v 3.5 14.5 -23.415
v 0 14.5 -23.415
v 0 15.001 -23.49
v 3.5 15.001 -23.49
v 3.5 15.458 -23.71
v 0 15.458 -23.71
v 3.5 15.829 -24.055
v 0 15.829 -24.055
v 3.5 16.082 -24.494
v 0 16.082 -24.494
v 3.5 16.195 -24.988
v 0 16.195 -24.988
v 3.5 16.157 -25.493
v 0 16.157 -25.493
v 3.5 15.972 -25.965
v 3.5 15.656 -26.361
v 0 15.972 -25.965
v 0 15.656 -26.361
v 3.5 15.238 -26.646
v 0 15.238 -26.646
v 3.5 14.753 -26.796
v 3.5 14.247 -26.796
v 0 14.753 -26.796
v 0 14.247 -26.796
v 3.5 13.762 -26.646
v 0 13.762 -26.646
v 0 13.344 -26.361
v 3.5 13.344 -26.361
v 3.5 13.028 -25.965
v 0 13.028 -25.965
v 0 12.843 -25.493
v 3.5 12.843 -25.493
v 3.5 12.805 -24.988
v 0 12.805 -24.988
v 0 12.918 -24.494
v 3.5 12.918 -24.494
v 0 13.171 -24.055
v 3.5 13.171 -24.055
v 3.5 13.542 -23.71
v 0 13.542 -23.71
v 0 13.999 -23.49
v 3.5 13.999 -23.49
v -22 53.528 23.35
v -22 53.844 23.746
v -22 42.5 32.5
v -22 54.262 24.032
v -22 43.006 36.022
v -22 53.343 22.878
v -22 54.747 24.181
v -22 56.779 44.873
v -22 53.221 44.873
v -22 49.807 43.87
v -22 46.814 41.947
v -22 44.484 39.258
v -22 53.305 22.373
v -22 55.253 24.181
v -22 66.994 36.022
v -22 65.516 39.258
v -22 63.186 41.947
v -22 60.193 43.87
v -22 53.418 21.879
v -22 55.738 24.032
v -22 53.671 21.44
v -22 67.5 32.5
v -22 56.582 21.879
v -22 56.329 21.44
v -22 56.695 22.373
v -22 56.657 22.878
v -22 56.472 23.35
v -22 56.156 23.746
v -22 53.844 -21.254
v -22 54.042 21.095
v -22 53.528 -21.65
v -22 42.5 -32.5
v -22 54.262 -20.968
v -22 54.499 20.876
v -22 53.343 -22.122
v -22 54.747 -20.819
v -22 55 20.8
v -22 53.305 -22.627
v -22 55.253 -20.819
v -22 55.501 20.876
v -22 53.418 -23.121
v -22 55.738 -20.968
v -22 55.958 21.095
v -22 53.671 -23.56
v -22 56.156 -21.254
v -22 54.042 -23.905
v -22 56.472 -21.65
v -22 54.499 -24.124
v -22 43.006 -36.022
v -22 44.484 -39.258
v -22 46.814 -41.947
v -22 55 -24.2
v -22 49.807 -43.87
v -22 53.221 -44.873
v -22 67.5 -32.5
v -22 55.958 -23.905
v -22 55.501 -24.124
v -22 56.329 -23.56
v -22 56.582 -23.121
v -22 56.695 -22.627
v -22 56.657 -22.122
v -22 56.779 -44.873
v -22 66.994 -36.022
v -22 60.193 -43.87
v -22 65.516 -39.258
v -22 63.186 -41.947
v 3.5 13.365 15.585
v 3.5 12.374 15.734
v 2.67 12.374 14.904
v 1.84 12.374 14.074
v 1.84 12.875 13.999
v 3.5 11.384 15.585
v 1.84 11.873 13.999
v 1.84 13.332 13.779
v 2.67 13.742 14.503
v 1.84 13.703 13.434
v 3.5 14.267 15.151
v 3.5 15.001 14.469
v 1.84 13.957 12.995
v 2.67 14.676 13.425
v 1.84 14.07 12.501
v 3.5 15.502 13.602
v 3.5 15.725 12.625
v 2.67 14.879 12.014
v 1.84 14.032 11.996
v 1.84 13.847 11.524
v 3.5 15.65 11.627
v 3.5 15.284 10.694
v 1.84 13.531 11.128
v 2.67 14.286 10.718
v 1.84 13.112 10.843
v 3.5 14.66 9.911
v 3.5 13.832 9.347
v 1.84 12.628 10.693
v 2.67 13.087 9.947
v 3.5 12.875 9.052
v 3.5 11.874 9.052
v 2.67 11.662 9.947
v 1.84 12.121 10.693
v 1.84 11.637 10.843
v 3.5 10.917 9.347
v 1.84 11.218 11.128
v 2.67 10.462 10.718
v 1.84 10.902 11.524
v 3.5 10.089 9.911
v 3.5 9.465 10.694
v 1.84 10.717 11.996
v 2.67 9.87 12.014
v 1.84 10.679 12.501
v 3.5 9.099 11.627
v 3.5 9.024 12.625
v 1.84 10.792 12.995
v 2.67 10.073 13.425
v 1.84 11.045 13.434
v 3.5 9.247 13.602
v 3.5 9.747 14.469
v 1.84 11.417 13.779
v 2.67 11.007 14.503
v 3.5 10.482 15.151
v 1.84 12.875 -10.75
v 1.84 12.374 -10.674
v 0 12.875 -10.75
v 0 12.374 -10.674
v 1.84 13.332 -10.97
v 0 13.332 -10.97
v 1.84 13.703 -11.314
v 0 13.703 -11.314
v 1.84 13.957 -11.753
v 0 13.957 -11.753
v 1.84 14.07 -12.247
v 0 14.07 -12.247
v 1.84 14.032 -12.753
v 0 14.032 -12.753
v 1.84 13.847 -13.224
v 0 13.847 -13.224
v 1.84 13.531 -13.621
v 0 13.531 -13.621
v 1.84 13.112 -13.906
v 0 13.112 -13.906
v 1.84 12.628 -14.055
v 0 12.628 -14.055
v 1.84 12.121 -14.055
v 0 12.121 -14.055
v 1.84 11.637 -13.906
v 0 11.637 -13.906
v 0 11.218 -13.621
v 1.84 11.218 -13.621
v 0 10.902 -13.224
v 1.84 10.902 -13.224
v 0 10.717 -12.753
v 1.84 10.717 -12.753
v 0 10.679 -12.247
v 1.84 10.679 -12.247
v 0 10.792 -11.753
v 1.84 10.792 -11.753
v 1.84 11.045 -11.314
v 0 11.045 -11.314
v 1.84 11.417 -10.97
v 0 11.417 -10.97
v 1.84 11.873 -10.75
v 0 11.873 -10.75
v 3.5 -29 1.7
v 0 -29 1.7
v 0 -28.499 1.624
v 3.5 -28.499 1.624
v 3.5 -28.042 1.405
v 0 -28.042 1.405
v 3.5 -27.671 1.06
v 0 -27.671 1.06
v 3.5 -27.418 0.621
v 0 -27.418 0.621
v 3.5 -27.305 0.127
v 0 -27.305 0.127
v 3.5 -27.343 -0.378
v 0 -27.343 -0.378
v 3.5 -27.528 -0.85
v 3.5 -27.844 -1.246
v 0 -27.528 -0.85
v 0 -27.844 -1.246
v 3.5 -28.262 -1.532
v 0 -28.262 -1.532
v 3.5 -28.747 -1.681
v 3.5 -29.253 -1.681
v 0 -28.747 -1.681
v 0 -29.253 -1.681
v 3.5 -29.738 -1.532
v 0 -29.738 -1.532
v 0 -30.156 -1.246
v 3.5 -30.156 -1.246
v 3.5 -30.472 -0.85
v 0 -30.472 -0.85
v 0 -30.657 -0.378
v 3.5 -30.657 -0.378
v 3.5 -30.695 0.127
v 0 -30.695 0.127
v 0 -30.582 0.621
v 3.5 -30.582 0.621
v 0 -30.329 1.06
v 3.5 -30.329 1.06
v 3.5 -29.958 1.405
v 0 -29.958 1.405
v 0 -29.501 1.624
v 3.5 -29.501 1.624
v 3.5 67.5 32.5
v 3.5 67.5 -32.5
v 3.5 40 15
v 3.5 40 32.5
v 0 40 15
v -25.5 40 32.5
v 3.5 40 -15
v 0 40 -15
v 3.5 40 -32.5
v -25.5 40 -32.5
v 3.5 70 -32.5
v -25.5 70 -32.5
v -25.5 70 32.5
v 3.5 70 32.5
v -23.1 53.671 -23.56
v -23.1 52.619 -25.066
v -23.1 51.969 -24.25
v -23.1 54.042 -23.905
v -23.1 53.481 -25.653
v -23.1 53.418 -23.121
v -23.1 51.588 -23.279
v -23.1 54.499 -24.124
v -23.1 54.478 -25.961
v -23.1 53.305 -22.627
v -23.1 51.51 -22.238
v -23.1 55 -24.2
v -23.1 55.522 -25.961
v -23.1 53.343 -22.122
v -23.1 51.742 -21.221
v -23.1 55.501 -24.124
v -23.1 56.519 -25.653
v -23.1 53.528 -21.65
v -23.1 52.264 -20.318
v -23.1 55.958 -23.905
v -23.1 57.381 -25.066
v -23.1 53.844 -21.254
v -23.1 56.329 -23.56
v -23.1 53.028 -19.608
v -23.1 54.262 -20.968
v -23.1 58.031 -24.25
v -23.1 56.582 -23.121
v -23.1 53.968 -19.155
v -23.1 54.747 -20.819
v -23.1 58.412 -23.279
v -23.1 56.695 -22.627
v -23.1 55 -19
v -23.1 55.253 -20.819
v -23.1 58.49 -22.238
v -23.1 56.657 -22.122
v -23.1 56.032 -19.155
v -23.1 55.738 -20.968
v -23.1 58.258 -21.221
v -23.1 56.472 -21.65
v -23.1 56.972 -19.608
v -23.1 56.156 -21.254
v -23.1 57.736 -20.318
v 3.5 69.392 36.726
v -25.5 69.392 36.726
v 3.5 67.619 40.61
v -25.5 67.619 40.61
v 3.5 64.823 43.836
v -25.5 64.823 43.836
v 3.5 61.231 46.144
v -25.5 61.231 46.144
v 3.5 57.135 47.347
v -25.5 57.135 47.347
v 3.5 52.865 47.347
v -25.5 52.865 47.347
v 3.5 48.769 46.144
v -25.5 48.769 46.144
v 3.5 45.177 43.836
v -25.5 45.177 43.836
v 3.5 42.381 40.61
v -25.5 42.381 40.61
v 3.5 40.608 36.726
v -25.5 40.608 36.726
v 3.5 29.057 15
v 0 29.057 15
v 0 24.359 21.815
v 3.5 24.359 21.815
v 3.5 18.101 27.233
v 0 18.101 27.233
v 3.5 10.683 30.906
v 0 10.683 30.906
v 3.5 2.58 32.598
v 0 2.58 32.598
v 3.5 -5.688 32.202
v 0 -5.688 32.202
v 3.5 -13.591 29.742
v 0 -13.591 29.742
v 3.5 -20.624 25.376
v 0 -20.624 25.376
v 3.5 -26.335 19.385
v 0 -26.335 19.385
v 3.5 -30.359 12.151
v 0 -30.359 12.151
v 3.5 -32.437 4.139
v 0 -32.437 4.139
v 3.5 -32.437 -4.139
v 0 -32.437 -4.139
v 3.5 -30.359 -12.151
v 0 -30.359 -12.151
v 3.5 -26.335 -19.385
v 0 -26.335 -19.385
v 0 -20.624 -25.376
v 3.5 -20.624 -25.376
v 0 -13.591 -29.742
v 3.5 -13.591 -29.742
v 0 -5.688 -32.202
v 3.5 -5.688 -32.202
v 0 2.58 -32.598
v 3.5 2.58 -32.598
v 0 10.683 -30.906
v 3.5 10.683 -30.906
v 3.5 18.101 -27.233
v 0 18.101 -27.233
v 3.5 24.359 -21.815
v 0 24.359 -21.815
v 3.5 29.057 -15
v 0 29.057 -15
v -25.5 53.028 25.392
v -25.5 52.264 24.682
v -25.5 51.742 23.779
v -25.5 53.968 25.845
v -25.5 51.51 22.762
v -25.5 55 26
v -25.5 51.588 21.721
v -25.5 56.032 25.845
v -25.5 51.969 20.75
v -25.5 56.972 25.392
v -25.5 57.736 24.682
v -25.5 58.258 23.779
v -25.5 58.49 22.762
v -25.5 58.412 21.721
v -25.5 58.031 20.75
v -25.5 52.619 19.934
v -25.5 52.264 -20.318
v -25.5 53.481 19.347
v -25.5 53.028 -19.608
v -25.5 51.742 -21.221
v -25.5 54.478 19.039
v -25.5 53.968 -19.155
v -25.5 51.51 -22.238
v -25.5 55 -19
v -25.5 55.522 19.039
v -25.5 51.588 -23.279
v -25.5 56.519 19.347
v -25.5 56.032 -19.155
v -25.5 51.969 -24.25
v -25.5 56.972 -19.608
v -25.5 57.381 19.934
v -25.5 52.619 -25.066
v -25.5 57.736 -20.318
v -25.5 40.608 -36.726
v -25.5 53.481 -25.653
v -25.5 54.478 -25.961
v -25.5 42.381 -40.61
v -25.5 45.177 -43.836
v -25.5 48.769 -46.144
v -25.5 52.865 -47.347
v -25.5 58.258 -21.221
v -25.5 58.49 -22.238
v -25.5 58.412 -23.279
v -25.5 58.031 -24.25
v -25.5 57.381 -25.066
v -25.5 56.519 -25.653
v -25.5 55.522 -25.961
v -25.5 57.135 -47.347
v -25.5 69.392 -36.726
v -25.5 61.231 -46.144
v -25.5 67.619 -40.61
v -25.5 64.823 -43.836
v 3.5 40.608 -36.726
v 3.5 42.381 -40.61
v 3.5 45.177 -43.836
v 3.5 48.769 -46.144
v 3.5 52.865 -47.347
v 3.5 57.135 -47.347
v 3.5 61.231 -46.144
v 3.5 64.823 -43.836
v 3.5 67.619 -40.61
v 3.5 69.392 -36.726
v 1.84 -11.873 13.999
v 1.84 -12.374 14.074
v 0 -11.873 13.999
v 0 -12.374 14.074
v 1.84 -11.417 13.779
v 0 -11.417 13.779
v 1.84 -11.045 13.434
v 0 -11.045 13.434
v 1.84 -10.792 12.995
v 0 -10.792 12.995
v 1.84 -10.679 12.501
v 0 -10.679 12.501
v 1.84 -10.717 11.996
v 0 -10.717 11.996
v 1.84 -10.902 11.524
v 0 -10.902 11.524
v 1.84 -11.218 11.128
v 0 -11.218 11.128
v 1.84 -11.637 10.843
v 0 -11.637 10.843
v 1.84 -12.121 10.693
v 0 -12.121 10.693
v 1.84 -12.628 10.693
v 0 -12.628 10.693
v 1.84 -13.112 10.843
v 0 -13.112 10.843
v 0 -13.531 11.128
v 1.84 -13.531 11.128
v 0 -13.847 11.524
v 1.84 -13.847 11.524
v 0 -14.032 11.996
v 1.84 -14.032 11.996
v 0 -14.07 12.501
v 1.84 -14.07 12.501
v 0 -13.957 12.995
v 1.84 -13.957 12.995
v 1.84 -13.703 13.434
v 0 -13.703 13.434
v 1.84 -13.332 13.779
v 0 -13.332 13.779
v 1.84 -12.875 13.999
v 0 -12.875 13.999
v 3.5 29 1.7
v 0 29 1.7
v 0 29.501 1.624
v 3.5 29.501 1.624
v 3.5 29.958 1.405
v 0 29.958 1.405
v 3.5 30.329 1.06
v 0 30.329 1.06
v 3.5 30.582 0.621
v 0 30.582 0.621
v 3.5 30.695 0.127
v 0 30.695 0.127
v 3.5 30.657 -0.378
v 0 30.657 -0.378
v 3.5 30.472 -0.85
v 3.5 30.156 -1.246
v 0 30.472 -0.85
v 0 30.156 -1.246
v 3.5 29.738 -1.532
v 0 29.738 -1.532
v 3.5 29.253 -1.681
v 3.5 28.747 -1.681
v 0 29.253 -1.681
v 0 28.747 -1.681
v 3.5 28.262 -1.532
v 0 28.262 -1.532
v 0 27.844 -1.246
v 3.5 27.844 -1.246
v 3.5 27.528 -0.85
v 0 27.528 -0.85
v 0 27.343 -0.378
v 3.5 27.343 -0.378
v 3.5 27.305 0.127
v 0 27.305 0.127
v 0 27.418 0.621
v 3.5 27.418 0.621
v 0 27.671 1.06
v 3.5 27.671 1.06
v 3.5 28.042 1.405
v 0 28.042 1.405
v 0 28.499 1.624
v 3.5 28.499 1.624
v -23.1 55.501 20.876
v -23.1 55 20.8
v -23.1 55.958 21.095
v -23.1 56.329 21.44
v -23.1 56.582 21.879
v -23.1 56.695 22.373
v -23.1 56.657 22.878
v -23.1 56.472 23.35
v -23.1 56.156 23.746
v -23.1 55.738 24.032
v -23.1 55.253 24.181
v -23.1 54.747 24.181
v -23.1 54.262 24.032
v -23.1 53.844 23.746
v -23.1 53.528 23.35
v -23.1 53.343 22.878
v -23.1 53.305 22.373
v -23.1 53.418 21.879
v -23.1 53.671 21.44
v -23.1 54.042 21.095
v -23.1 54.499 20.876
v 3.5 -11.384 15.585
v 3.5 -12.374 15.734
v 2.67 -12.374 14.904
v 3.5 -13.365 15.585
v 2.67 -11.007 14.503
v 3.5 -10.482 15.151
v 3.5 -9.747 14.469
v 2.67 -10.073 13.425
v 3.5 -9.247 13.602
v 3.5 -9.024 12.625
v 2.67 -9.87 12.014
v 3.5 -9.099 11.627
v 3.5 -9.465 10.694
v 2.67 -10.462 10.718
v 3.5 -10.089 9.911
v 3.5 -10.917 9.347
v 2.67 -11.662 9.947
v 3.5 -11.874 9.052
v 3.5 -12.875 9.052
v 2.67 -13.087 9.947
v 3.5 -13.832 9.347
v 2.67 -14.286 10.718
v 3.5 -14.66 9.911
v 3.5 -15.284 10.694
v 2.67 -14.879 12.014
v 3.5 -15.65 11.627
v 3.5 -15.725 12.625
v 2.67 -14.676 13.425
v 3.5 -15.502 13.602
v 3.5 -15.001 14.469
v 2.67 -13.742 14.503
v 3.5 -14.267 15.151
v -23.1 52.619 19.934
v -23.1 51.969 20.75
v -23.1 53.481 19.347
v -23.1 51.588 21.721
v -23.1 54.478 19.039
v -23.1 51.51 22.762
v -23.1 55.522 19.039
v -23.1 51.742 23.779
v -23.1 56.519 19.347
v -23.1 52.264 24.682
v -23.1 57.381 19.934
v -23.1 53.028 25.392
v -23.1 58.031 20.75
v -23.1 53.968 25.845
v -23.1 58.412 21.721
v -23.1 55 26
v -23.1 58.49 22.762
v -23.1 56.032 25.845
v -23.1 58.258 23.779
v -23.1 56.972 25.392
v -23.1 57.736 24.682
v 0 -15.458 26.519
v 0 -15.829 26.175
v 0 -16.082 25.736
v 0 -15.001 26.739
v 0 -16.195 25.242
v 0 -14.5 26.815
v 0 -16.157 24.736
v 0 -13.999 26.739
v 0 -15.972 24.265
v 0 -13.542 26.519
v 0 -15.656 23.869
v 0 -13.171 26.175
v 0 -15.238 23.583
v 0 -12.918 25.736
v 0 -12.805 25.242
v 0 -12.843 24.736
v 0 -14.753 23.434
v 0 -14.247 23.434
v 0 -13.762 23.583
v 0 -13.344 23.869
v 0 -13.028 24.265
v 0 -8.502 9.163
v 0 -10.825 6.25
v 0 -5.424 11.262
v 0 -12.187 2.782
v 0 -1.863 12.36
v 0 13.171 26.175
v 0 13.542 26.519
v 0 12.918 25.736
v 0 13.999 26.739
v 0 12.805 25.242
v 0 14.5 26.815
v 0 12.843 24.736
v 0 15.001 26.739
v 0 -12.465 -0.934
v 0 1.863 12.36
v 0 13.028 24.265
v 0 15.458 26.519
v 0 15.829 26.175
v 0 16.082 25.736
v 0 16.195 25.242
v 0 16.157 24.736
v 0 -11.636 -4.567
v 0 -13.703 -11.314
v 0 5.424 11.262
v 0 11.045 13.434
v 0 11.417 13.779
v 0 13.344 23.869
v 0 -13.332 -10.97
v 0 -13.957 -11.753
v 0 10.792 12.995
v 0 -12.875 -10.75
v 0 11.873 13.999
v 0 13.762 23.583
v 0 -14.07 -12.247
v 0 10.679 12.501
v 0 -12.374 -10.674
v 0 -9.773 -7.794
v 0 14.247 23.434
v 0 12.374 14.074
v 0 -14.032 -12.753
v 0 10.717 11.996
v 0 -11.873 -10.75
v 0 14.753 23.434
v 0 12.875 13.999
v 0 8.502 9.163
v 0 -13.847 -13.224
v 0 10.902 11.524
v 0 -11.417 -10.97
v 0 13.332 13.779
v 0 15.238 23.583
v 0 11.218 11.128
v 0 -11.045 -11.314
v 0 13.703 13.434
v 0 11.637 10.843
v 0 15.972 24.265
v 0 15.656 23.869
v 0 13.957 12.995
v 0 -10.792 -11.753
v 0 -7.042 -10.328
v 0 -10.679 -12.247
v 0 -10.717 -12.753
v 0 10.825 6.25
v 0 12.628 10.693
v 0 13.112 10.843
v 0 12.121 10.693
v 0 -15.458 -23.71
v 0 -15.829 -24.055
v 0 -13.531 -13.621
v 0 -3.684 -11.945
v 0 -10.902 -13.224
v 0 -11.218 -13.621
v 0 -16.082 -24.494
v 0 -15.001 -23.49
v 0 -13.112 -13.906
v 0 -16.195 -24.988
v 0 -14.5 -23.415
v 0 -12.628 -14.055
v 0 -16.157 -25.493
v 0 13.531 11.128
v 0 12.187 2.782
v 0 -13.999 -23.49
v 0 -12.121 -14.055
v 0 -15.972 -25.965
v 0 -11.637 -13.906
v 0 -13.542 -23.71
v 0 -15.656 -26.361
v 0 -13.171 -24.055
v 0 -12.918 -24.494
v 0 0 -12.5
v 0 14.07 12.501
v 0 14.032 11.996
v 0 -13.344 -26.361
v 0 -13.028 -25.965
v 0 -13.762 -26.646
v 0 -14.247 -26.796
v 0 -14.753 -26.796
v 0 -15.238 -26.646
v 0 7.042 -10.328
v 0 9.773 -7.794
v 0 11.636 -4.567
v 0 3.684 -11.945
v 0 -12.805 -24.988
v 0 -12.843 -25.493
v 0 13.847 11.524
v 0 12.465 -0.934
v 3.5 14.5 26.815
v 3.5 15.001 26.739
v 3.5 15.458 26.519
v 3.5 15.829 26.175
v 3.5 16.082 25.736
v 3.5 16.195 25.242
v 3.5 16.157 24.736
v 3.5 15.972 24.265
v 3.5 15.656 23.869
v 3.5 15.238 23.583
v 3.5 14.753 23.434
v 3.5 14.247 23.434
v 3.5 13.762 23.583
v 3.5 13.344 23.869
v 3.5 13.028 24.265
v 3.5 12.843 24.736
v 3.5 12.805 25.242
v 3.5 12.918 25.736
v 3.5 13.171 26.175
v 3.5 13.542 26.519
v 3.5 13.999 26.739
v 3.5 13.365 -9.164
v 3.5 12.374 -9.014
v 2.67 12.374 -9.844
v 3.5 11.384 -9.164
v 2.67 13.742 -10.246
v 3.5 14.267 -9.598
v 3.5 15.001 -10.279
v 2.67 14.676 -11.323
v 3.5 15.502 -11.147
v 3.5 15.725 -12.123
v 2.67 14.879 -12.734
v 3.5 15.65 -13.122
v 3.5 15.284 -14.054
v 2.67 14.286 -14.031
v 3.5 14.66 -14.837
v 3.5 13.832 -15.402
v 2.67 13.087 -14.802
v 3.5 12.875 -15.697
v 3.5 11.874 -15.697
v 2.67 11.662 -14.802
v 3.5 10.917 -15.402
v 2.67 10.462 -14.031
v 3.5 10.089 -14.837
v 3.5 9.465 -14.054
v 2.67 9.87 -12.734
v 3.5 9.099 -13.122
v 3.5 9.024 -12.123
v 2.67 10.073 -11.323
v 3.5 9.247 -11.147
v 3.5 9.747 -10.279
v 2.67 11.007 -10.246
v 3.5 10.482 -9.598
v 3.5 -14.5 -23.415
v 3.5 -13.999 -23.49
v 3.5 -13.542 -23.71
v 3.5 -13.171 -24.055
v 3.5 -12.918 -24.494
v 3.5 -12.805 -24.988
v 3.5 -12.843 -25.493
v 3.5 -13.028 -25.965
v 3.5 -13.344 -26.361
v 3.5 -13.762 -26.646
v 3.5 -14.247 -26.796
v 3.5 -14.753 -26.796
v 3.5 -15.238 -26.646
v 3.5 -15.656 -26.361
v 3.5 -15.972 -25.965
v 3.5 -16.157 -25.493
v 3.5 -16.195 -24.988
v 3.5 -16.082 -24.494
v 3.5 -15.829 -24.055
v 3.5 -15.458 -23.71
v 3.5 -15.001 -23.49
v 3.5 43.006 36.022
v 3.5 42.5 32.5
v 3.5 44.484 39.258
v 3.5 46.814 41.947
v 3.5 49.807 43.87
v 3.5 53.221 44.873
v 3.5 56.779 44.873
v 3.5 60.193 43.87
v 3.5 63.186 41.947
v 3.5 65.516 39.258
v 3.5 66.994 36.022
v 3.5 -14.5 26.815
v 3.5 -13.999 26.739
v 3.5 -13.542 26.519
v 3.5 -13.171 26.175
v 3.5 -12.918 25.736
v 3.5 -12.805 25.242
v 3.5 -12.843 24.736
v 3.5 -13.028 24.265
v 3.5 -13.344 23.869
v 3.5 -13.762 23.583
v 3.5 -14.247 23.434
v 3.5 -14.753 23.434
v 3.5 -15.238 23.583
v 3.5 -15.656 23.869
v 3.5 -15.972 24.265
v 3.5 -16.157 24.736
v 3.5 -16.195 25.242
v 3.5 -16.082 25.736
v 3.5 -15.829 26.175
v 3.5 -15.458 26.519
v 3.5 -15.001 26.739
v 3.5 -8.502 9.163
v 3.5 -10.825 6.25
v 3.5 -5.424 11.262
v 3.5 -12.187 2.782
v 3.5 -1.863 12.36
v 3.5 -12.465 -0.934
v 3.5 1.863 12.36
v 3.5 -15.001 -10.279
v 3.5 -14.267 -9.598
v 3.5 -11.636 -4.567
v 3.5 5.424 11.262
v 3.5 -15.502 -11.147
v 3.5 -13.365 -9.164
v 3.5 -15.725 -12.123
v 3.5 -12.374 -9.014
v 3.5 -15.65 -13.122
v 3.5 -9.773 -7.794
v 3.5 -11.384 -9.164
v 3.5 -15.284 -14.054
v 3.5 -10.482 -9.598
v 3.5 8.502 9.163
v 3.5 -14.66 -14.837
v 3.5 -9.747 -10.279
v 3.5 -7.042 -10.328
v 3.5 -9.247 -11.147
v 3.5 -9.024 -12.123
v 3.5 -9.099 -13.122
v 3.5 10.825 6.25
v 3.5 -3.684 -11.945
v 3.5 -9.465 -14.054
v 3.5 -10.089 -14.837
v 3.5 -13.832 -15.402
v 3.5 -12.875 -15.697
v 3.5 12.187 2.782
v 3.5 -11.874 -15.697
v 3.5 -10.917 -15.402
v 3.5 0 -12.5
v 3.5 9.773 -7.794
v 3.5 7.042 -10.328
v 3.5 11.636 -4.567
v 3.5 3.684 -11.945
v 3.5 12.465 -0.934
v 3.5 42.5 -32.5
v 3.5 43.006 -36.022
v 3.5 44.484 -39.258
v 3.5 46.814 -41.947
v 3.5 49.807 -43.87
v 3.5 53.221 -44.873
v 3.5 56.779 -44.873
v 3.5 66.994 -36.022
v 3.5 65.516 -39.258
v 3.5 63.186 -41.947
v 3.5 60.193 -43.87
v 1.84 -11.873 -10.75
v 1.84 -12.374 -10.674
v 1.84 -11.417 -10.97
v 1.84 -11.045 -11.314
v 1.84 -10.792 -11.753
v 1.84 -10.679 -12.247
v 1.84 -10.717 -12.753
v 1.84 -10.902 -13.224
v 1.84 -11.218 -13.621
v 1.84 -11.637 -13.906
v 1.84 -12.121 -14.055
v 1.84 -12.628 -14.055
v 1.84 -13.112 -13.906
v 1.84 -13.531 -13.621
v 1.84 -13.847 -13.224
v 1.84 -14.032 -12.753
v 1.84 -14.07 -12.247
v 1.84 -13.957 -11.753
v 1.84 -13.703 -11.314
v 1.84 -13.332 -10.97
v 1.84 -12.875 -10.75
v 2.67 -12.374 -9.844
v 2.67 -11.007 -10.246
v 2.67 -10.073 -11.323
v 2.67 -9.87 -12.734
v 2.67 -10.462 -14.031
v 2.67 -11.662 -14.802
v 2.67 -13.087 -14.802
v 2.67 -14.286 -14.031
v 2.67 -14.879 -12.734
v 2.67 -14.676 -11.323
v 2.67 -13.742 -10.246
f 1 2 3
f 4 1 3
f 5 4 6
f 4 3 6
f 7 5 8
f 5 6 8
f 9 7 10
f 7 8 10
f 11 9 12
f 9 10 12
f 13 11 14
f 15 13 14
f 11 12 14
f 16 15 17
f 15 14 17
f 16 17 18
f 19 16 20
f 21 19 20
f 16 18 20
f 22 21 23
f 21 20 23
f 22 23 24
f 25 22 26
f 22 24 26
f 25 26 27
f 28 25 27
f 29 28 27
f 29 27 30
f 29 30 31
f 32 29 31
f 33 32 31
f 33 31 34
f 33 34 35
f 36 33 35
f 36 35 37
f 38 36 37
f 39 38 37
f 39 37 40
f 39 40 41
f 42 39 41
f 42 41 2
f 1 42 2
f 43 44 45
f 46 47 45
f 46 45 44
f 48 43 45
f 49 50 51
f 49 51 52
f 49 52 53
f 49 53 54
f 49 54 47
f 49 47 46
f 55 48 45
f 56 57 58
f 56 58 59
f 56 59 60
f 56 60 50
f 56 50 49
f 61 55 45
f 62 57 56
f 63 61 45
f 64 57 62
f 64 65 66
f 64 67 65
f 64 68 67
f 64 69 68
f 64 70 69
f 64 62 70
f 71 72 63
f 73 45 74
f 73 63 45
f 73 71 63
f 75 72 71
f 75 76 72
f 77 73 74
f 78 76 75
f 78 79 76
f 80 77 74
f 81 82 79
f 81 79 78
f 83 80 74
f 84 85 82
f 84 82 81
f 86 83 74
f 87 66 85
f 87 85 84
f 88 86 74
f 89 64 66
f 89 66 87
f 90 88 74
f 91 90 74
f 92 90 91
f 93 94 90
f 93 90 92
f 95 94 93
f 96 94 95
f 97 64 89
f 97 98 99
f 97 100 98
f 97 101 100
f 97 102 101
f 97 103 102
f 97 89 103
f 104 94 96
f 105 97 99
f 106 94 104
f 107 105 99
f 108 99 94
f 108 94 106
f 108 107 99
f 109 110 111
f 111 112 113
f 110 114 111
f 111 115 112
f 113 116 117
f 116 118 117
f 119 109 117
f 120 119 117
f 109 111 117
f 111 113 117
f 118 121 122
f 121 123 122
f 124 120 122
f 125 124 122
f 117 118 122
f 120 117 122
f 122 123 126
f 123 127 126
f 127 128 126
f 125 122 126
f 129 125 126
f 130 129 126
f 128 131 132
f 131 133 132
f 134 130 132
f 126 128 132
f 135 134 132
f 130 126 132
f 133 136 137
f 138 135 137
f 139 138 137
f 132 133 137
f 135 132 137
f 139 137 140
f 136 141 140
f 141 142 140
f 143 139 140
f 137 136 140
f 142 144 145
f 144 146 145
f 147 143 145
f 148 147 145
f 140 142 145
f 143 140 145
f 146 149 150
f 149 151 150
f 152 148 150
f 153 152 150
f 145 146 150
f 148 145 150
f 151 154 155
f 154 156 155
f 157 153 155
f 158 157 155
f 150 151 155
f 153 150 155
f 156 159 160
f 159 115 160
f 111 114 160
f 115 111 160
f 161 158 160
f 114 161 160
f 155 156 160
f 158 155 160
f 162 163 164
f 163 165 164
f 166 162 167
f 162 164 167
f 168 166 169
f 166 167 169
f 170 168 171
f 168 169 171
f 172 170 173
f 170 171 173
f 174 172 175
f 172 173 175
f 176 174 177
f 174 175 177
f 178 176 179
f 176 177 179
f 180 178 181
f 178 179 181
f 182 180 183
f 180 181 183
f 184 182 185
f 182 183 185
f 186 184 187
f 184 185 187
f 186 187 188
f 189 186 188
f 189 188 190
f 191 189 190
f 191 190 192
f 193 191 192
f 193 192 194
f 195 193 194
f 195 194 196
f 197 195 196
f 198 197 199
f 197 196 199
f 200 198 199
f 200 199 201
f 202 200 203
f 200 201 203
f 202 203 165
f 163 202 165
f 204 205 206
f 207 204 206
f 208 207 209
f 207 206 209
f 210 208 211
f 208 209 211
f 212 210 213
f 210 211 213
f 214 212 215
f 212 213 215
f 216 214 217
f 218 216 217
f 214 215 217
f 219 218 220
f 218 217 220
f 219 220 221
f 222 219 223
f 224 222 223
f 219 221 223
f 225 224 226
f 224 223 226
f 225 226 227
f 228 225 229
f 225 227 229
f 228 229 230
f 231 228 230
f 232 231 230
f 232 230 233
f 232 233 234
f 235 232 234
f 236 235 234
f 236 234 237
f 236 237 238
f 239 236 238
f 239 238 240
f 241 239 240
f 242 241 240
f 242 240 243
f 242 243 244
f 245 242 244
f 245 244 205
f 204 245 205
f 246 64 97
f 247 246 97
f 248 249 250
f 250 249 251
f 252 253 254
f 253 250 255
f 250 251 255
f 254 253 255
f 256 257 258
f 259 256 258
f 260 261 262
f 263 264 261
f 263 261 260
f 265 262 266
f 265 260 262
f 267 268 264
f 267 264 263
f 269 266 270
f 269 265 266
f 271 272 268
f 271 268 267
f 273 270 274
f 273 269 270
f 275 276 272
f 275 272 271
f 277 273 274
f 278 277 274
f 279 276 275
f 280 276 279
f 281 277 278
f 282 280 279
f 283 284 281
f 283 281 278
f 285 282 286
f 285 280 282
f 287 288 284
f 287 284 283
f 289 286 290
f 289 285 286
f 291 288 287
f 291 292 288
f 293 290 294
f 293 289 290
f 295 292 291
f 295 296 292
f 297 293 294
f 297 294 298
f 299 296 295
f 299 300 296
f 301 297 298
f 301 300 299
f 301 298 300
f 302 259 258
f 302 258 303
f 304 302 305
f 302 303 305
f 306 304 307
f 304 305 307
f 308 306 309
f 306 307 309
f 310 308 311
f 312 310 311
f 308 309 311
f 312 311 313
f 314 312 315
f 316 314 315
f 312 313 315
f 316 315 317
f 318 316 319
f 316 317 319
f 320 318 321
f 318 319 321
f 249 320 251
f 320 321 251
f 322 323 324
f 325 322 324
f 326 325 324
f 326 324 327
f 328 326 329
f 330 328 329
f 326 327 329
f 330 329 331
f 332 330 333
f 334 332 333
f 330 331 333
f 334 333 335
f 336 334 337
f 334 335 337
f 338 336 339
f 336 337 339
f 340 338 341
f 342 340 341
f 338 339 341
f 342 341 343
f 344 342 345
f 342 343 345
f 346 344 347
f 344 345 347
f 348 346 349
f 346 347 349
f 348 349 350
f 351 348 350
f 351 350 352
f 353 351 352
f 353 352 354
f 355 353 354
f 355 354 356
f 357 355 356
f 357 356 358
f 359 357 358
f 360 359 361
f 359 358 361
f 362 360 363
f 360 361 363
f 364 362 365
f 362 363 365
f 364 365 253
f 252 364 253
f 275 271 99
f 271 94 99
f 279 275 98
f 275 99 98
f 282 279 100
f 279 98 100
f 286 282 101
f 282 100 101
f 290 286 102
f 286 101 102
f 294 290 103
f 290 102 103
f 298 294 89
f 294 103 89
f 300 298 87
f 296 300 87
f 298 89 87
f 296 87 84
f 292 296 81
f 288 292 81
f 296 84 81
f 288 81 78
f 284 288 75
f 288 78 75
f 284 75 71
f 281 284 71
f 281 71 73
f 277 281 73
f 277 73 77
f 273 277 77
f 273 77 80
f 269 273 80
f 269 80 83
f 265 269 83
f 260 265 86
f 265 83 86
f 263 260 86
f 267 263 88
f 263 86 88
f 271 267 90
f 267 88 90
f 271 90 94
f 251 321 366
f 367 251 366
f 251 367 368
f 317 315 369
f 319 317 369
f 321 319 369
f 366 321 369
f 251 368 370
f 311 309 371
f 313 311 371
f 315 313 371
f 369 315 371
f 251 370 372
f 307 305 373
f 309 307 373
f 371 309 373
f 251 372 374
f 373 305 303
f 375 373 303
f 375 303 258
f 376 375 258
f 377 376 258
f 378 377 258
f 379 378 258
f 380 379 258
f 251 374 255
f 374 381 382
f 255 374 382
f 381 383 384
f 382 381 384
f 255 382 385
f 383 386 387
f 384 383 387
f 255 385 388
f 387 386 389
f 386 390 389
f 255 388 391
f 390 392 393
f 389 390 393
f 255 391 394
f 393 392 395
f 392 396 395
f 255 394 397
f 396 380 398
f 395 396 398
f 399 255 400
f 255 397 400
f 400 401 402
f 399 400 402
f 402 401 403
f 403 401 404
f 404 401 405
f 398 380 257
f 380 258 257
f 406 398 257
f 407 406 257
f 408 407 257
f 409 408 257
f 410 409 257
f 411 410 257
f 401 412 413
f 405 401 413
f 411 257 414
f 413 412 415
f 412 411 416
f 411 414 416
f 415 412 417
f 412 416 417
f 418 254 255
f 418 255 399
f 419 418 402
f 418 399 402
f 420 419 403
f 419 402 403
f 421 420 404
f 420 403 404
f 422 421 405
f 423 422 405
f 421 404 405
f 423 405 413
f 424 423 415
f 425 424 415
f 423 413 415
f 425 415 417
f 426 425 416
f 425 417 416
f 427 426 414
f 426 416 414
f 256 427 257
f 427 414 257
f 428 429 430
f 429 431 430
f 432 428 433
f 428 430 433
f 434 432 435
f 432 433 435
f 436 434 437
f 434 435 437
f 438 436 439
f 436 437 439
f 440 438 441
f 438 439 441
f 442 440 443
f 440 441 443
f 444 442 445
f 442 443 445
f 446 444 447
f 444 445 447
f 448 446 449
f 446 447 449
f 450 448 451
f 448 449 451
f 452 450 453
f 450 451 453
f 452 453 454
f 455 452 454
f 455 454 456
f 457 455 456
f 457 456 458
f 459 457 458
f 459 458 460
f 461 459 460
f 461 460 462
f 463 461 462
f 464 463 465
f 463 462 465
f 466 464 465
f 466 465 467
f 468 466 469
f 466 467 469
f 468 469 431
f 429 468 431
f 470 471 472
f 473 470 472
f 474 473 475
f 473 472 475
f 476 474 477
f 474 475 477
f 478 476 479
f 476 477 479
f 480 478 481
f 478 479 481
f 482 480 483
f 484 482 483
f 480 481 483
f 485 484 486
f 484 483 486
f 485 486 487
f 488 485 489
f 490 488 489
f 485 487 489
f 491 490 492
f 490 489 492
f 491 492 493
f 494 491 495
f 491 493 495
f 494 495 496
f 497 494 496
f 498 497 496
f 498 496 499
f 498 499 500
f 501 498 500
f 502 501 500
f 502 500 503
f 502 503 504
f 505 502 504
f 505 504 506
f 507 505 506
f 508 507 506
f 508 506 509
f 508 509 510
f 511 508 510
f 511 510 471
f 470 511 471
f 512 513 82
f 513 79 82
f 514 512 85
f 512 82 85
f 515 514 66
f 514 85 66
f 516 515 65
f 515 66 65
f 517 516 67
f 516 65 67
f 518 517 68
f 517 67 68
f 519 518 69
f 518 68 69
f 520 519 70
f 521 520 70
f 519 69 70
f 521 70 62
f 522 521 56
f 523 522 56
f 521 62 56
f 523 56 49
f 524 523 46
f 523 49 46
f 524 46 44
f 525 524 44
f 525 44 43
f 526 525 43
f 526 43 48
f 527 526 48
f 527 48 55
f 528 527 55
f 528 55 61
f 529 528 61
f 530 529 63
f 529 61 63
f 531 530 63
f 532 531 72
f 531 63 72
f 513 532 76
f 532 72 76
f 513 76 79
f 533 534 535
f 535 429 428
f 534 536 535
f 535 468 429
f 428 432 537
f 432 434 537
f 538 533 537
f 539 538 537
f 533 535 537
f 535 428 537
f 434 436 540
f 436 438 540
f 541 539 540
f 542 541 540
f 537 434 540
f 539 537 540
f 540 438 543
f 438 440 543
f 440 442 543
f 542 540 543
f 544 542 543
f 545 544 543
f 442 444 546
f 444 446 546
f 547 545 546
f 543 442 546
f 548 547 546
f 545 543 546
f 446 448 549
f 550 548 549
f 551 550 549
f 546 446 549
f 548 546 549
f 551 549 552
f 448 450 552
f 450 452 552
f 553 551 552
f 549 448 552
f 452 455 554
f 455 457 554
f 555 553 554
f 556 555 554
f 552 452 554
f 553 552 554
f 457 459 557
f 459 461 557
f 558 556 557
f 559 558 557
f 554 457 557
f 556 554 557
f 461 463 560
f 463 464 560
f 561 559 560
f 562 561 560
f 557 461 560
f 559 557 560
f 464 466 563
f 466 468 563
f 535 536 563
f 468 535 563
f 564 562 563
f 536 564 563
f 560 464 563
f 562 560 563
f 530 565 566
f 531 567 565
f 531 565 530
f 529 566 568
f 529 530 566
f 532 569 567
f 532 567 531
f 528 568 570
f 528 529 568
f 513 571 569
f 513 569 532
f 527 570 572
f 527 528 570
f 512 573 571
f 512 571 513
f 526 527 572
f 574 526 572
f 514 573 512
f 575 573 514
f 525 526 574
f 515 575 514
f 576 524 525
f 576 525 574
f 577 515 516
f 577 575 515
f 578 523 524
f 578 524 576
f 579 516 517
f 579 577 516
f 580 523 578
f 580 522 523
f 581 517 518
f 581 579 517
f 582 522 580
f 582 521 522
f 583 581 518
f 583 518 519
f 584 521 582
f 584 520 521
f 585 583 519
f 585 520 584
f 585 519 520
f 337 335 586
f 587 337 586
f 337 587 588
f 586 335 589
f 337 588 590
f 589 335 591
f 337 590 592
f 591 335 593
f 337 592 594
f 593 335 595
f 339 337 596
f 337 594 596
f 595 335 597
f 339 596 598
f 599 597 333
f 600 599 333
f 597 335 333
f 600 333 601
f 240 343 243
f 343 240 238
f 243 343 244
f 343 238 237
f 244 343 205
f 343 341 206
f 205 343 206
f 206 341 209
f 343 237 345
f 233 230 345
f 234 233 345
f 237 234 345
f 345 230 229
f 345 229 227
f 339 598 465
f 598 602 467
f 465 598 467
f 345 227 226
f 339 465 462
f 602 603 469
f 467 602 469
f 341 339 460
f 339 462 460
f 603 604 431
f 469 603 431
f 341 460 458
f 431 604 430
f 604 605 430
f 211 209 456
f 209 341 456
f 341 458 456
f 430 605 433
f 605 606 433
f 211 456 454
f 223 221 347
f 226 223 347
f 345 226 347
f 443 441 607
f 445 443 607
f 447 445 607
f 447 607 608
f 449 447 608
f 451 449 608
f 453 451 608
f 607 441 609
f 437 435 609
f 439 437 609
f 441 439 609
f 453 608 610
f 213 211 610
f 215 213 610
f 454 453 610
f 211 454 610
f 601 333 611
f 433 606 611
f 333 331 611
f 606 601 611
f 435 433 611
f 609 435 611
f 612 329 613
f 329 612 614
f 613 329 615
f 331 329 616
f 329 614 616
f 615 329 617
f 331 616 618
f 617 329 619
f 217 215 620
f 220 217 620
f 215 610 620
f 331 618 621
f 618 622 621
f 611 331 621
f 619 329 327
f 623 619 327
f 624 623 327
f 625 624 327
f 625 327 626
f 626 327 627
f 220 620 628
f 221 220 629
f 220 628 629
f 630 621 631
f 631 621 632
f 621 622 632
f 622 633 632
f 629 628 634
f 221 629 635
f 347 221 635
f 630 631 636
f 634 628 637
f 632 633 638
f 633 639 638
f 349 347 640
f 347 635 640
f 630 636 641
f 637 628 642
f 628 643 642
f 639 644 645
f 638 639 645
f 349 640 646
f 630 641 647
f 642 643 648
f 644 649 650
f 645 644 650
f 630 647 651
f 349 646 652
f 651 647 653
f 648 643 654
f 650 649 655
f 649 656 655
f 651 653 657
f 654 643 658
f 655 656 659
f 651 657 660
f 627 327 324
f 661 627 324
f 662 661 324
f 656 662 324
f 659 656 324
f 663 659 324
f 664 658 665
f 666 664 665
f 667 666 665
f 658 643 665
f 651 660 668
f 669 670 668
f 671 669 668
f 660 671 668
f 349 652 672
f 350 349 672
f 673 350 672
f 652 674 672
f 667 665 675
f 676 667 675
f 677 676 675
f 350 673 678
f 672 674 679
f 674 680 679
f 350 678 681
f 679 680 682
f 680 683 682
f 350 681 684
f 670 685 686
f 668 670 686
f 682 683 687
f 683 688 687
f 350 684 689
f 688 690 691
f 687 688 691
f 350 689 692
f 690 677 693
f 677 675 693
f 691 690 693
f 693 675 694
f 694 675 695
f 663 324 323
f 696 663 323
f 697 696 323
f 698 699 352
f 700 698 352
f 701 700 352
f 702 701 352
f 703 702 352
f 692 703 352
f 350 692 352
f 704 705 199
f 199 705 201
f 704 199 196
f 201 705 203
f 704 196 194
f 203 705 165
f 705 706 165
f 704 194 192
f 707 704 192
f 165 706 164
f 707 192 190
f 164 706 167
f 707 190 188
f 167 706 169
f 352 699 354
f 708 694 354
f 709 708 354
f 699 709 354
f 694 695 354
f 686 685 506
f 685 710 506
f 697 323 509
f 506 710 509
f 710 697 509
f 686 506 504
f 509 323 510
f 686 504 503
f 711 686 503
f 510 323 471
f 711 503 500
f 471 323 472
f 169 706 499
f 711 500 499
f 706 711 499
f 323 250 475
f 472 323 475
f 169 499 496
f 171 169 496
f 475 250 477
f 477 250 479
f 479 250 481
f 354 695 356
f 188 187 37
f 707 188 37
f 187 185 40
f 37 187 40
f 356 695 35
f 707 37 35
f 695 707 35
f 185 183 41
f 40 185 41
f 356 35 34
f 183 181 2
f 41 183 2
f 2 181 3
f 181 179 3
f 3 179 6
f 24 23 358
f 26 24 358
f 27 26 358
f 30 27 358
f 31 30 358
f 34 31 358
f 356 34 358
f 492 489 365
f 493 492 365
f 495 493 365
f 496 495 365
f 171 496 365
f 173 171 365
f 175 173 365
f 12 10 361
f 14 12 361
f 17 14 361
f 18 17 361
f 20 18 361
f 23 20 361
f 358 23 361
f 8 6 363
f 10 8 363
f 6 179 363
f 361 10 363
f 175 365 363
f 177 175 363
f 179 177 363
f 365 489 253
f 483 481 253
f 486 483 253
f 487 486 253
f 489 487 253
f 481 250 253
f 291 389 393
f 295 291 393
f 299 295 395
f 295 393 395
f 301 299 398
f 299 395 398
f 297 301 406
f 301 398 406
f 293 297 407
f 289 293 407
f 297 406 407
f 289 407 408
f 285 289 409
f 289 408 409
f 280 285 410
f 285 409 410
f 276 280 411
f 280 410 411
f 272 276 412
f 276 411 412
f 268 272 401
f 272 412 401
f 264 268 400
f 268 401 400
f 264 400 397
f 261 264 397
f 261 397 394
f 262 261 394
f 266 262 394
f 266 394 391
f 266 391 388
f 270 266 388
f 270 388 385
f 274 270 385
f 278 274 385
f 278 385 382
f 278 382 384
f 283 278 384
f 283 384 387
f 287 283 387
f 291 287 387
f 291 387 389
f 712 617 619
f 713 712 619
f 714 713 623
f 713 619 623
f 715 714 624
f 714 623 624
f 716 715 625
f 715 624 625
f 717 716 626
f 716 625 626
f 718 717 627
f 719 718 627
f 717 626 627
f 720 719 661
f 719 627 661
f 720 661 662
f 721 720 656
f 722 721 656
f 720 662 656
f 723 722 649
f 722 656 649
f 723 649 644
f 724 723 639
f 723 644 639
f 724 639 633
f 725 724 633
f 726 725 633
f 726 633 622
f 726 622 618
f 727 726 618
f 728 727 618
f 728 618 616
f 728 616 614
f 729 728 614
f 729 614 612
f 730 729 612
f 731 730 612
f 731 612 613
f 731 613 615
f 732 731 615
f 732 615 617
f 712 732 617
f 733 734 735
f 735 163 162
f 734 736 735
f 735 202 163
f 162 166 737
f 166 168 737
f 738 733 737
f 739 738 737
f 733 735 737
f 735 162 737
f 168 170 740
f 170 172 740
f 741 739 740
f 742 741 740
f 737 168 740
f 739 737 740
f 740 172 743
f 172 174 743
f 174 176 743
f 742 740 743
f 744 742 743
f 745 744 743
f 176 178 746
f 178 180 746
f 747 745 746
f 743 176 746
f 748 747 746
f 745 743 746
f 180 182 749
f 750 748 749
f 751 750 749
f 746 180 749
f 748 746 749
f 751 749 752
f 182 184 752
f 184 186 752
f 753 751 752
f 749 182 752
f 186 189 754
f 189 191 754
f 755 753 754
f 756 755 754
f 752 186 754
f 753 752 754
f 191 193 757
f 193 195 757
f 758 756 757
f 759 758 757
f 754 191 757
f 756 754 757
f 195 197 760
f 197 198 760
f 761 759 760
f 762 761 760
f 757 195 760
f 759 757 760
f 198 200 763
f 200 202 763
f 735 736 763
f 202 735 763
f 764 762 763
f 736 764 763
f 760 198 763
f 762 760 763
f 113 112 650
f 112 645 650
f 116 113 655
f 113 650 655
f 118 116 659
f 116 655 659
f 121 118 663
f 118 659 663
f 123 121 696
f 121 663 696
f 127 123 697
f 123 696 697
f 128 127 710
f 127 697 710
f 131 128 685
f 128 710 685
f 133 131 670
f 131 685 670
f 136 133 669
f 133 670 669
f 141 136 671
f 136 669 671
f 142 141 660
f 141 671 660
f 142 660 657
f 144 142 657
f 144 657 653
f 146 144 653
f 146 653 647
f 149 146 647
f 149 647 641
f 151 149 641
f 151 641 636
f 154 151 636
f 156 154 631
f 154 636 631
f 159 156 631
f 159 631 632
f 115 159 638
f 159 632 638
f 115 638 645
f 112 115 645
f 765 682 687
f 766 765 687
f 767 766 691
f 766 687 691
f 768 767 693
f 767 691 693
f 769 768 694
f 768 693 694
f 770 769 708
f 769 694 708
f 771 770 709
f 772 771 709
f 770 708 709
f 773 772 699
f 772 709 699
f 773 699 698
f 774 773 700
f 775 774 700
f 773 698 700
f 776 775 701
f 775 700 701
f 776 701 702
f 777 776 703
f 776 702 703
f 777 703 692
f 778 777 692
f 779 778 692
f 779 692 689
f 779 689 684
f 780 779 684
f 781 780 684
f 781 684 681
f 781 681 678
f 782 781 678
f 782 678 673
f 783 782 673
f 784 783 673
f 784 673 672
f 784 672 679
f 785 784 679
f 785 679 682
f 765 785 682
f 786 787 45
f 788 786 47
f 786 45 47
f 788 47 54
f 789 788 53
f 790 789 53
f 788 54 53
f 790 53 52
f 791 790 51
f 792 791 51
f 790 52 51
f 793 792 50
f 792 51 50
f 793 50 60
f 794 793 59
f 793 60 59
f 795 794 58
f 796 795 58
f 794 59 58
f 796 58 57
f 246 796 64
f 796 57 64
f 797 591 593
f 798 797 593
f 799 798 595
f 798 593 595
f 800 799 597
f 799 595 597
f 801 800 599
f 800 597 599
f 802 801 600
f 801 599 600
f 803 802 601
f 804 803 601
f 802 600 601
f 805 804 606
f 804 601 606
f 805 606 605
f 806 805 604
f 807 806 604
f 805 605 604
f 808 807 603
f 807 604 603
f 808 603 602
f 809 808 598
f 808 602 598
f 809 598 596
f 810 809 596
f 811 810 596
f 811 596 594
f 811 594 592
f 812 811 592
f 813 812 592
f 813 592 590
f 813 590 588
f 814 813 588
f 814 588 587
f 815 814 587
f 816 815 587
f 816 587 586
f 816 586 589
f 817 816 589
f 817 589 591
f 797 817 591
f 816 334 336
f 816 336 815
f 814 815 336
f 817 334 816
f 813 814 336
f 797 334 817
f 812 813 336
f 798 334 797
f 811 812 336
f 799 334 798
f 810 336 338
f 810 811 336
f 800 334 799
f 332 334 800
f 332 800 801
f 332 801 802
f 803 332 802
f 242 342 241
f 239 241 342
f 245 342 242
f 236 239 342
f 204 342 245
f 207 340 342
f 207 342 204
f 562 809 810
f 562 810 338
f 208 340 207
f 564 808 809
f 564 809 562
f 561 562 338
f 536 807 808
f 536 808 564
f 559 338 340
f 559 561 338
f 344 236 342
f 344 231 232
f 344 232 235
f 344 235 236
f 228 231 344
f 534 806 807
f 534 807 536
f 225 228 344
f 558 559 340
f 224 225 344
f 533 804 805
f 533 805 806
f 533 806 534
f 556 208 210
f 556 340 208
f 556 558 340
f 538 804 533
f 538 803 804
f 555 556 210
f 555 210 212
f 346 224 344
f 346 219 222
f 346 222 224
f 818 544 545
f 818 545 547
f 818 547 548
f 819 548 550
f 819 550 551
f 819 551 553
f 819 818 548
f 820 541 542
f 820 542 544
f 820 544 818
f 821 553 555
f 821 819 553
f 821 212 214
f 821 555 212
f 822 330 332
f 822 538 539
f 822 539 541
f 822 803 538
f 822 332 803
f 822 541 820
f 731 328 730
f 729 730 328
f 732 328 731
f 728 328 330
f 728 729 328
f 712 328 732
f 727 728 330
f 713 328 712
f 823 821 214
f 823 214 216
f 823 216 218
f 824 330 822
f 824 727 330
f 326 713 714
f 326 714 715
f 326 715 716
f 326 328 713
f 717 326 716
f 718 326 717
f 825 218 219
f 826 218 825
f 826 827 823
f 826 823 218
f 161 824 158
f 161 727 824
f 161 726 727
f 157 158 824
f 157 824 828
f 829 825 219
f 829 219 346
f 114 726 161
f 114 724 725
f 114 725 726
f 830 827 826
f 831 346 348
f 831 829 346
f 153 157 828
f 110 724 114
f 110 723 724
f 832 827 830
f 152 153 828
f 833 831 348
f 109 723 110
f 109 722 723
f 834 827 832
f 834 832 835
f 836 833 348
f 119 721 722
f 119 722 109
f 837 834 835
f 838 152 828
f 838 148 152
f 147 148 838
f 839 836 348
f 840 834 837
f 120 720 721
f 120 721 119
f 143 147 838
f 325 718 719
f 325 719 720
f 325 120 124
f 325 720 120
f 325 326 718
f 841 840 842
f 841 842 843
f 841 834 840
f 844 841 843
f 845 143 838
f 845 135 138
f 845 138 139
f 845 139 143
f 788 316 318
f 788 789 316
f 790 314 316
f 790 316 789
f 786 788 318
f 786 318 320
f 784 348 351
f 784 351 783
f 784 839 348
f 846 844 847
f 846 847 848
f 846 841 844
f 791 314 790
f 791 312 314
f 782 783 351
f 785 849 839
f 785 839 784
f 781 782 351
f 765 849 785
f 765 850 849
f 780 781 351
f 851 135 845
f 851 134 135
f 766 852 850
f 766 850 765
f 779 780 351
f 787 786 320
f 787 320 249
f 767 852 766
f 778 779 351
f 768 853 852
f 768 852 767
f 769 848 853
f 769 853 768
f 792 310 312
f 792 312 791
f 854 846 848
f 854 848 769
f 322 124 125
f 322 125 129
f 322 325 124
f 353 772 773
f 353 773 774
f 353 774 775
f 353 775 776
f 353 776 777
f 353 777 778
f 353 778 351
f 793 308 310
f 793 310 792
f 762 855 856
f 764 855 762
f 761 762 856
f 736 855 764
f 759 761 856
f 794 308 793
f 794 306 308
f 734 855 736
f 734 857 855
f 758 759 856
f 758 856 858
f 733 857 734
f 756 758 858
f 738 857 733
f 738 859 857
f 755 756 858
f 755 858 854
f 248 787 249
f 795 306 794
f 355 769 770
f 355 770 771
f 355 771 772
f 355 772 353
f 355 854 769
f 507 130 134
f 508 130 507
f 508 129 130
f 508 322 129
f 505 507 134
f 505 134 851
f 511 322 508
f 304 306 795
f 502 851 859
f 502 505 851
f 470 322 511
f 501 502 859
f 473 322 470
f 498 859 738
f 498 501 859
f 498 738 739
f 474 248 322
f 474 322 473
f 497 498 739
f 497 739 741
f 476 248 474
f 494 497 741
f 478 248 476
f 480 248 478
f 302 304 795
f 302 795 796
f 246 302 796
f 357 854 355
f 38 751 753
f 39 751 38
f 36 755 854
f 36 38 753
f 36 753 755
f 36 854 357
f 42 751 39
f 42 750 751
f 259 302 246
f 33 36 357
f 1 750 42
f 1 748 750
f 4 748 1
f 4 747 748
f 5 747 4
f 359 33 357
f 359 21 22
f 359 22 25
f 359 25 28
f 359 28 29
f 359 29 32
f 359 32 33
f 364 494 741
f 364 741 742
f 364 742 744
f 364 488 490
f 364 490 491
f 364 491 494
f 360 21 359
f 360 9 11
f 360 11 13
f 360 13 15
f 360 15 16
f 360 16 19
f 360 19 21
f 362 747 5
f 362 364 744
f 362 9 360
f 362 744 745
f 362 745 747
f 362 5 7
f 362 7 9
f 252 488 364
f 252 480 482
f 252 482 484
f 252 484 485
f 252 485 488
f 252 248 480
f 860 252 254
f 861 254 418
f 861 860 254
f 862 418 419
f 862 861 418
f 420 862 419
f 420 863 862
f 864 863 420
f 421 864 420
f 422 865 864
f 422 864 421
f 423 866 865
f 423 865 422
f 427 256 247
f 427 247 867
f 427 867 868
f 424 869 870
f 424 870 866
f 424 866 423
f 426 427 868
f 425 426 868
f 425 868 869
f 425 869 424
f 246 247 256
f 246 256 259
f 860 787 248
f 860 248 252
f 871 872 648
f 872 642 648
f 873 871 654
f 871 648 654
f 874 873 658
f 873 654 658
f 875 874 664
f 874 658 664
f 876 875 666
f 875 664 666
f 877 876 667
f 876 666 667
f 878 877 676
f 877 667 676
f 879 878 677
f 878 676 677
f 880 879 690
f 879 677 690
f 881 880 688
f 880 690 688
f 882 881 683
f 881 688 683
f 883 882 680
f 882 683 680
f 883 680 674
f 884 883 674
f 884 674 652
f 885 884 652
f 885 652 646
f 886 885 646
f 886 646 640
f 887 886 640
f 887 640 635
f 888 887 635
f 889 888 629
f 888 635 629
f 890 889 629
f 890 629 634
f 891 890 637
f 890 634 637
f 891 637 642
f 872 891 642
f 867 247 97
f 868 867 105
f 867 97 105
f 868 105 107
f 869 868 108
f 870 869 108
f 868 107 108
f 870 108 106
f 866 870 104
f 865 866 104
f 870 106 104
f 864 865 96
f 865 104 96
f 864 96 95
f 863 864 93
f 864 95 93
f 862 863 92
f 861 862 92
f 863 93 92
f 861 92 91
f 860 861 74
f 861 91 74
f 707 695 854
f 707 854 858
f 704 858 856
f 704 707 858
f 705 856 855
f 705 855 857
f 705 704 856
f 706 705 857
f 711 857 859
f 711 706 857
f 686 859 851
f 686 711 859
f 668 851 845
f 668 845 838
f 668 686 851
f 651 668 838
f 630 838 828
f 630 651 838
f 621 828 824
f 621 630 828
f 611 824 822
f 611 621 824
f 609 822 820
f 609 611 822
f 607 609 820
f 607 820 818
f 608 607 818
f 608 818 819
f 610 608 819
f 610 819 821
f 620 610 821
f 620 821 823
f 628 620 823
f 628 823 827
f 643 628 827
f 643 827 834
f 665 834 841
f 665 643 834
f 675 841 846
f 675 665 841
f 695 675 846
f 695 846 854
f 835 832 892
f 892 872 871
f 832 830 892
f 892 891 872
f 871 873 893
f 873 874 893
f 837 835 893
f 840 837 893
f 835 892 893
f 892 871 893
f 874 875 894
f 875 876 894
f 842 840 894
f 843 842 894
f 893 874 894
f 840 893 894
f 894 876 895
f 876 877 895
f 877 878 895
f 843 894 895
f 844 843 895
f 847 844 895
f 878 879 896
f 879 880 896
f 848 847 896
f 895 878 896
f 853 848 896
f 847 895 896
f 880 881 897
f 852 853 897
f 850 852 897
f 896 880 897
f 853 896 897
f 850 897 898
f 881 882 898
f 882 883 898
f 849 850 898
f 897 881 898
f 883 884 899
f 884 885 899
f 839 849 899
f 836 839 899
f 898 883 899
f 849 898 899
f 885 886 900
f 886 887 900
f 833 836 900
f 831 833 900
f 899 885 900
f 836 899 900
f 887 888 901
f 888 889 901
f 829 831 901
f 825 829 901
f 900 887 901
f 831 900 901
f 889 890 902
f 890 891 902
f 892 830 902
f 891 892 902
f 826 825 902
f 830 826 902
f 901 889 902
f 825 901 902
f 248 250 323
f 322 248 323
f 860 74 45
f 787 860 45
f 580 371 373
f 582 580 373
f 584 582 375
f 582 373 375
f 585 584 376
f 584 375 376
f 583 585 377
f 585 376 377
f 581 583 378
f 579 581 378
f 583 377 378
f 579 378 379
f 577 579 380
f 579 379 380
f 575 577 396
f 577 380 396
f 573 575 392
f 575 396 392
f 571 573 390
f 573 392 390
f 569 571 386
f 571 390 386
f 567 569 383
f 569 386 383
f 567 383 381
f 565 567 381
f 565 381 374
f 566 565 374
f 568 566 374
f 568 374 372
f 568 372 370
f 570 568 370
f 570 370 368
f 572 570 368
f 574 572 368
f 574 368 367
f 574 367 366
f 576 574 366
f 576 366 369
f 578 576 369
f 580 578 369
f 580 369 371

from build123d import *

# Parameters (mm, degrees)
CROQUIS1_R                                           = 12.5
SALIENTE_EXTRUIR1_DEPTH                              = 3.5
TALADRO_DE_MARGEN_PARA_M31_D                         = 3.4
REFRENTADO_PARA_TORNILLO_TAP_N_CON_CABEZ_D           = 3.4
REFRENTADO_PARA_TORNILLO_TAP_N_CON_CABEZ_CSINK_D     = 6.72
REFRENTADO_PARA_TORNILLO_TAP_N_CON_CABEZ_CSINK_ANGLE = 90
SALIENTE_EXTRUIR2_START                              = -29
SALIENTE_EXTRUIR2_DEPTH                              = 29
SALIENTE_EXTRUIR3_DEPTH                              = 3.5
REFRENTADO_PARA_TORNILLO_CON_CABEZA_TRON_D           = 3.4
REFRENTADO_PARA_TORNILLO_CON_CABEZA_TRON_CBORE_D     = 7
REFRENTADO_PARA_TORNILLO_CON_CABEZA_TRON_CBORE_DEPTH = 2.4


with BuildPart() as part:
    # Croquis1 → Saliente-Extruir1 (new body)
    with BuildSketch(Plane(origin=(0, 0, 0), x_dir=(0, 0, -1), z_dir=(1, 0, 0))):
        with BuildLine():
            Line((-15, 40), (-15, 29.05666877))
            ThreePointArc((-15, 29.05666877), (0, -32.7), (15, 29.05666877))
            Line((15, 29.05666877), (15, 40))
            Line((15, 40), (32.5, 40))
            ThreePointArc((32.5, 40), (47.5, 55), (32.5, 70))
            Line((32.5, 70), (-32.5, 70))
            ThreePointArc((-32.5, 70), (-47.5, 55), (-32.5, 40))
            Line((-32.5, 40), (-15, 40))
        make_face()
        Circle(CROQUIS1_R, mode=Mode.SUBTRACT)
        with BuildLine():
            Line((-32.5, 67.5), (32.5, 67.5))
            ThreePointArc((32.5, 67.5), (45, 55), (32.5, 42.5))
            Line((32.5, 42.5), (-32.5, 42.5))
            ThreePointArc((-32.5, 42.5), (-45, 55), (-32.5, 67.5))
        make_face(mode=Mode.SUBTRACT)
    extrude(amount=SALIENTE_EXTRUIR1_DEPTH)

    # Taladro de margen para M31 (through all)
    with Locations(Plane(origin=(3.5, 0, 0), x_dir=(0, 0, -1), z_dir=(1, 0, 0))):
        with Locations((0, 29), (25.11473671, 14.5), (25.11473671, -14.5), (0, -29), (-25.11473671, -14.5), (-25.11473671, 14.5)):
            Hole(TALADRO_DE_MARGEN_PARA_M31_D / 2)

    # Refrentado para tornillo tapón con cabeza plana de clavija de M31 (through all)
    with Locations(Plane(origin=(3.5, 0, 0), x_dir=(0, 0, -1), z_dir=(1, 0, 0))):
        with Locations((12.374368671, 12.374368671), (-12.374368671, -12.374368671), (-12.374368671, 12.374368671), (12.374368671, -12.374368671)):
            CounterSinkHole(REFRENTADO_PARA_TORNILLO_TAP_N_CON_CABEZ_D / 2, REFRENTADO_PARA_TORNILLO_TAP_N_CON_CABEZ_CSINK_D / 2, counter_sink_angle=REFRENTADO_PARA_TORNILLO_TAP_N_CON_CABEZ_CSINK_ANGLE)

    # Croquis8 → Saliente-Extruir2 (add)
    with BuildSketch(Plane(origin=(3.5, 0, 0), x_dir=(0, 0, -1), z_dir=(1, 0, 0)).offset(SALIENTE_EXTRUIR2_START)):
        with BuildLine():
            Line((15, 40), (32.5, 40))
            ThreePointArc((32.5, 40), (47.5, 55), (32.5, 70))
            Line((32.5, 70), (-32.5, 70))
            ThreePointArc((-32.5, 70), (-47.5, 55), (-32.5, 40))
            Line((-32.5, 40), (-15, 40))
            Line((-15, 40), (15, 40))
        make_face()
        with BuildLine():
            Line((-32.5, 67.5), (32.5, 67.5))
            ThreePointArc((32.5, 67.5), (45, 55), (32.5, 42.5))
            Line((32.5, 42.5), (-32.5, 42.5))
            ThreePointArc((-32.5, 42.5), (-45, 55), (-32.5, 67.5))
        make_face(mode=Mode.SUBTRACT)
    extrude(amount=SALIENTE_EXTRUIR2_DEPTH)

    # Croquis12 → Saliente-Extruir3 (add)
    with BuildSketch(Plane.ZY.offset(25.5)):
        with BuildLine():
            Line((32.5, 42.5), (-32.5, 42.5))
            ThreePointArc((-32.5, 42.5), (-45, 55), (-32.5, 67.5))
            Line((-32.5, 67.5), (32.5, 67.5))
            ThreePointArc((32.5, 67.5), (45, 55), (32.5, 42.5))
        make_face()
    extrude(amount=-SALIENTE_EXTRUIR3_DEPTH)

    # Refrentado para tornillo con cabeza troncocónica de M31 (through all)
    with Locations(Plane.ZY.offset(25.5)):
        with Locations((-22.5, 55), (22.5, 55)):
            CounterBoreHole(REFRENTADO_PARA_TORNILLO_CON_CABEZA_TRON_D / 2, REFRENTADO_PARA_TORNILLO_CON_CABEZA_TRON_CBORE_D / 2, REFRENTADO_PARA_TORNILLO_CON_CABEZA_TRON_CBORE_DEPTH)


solid = part.part
